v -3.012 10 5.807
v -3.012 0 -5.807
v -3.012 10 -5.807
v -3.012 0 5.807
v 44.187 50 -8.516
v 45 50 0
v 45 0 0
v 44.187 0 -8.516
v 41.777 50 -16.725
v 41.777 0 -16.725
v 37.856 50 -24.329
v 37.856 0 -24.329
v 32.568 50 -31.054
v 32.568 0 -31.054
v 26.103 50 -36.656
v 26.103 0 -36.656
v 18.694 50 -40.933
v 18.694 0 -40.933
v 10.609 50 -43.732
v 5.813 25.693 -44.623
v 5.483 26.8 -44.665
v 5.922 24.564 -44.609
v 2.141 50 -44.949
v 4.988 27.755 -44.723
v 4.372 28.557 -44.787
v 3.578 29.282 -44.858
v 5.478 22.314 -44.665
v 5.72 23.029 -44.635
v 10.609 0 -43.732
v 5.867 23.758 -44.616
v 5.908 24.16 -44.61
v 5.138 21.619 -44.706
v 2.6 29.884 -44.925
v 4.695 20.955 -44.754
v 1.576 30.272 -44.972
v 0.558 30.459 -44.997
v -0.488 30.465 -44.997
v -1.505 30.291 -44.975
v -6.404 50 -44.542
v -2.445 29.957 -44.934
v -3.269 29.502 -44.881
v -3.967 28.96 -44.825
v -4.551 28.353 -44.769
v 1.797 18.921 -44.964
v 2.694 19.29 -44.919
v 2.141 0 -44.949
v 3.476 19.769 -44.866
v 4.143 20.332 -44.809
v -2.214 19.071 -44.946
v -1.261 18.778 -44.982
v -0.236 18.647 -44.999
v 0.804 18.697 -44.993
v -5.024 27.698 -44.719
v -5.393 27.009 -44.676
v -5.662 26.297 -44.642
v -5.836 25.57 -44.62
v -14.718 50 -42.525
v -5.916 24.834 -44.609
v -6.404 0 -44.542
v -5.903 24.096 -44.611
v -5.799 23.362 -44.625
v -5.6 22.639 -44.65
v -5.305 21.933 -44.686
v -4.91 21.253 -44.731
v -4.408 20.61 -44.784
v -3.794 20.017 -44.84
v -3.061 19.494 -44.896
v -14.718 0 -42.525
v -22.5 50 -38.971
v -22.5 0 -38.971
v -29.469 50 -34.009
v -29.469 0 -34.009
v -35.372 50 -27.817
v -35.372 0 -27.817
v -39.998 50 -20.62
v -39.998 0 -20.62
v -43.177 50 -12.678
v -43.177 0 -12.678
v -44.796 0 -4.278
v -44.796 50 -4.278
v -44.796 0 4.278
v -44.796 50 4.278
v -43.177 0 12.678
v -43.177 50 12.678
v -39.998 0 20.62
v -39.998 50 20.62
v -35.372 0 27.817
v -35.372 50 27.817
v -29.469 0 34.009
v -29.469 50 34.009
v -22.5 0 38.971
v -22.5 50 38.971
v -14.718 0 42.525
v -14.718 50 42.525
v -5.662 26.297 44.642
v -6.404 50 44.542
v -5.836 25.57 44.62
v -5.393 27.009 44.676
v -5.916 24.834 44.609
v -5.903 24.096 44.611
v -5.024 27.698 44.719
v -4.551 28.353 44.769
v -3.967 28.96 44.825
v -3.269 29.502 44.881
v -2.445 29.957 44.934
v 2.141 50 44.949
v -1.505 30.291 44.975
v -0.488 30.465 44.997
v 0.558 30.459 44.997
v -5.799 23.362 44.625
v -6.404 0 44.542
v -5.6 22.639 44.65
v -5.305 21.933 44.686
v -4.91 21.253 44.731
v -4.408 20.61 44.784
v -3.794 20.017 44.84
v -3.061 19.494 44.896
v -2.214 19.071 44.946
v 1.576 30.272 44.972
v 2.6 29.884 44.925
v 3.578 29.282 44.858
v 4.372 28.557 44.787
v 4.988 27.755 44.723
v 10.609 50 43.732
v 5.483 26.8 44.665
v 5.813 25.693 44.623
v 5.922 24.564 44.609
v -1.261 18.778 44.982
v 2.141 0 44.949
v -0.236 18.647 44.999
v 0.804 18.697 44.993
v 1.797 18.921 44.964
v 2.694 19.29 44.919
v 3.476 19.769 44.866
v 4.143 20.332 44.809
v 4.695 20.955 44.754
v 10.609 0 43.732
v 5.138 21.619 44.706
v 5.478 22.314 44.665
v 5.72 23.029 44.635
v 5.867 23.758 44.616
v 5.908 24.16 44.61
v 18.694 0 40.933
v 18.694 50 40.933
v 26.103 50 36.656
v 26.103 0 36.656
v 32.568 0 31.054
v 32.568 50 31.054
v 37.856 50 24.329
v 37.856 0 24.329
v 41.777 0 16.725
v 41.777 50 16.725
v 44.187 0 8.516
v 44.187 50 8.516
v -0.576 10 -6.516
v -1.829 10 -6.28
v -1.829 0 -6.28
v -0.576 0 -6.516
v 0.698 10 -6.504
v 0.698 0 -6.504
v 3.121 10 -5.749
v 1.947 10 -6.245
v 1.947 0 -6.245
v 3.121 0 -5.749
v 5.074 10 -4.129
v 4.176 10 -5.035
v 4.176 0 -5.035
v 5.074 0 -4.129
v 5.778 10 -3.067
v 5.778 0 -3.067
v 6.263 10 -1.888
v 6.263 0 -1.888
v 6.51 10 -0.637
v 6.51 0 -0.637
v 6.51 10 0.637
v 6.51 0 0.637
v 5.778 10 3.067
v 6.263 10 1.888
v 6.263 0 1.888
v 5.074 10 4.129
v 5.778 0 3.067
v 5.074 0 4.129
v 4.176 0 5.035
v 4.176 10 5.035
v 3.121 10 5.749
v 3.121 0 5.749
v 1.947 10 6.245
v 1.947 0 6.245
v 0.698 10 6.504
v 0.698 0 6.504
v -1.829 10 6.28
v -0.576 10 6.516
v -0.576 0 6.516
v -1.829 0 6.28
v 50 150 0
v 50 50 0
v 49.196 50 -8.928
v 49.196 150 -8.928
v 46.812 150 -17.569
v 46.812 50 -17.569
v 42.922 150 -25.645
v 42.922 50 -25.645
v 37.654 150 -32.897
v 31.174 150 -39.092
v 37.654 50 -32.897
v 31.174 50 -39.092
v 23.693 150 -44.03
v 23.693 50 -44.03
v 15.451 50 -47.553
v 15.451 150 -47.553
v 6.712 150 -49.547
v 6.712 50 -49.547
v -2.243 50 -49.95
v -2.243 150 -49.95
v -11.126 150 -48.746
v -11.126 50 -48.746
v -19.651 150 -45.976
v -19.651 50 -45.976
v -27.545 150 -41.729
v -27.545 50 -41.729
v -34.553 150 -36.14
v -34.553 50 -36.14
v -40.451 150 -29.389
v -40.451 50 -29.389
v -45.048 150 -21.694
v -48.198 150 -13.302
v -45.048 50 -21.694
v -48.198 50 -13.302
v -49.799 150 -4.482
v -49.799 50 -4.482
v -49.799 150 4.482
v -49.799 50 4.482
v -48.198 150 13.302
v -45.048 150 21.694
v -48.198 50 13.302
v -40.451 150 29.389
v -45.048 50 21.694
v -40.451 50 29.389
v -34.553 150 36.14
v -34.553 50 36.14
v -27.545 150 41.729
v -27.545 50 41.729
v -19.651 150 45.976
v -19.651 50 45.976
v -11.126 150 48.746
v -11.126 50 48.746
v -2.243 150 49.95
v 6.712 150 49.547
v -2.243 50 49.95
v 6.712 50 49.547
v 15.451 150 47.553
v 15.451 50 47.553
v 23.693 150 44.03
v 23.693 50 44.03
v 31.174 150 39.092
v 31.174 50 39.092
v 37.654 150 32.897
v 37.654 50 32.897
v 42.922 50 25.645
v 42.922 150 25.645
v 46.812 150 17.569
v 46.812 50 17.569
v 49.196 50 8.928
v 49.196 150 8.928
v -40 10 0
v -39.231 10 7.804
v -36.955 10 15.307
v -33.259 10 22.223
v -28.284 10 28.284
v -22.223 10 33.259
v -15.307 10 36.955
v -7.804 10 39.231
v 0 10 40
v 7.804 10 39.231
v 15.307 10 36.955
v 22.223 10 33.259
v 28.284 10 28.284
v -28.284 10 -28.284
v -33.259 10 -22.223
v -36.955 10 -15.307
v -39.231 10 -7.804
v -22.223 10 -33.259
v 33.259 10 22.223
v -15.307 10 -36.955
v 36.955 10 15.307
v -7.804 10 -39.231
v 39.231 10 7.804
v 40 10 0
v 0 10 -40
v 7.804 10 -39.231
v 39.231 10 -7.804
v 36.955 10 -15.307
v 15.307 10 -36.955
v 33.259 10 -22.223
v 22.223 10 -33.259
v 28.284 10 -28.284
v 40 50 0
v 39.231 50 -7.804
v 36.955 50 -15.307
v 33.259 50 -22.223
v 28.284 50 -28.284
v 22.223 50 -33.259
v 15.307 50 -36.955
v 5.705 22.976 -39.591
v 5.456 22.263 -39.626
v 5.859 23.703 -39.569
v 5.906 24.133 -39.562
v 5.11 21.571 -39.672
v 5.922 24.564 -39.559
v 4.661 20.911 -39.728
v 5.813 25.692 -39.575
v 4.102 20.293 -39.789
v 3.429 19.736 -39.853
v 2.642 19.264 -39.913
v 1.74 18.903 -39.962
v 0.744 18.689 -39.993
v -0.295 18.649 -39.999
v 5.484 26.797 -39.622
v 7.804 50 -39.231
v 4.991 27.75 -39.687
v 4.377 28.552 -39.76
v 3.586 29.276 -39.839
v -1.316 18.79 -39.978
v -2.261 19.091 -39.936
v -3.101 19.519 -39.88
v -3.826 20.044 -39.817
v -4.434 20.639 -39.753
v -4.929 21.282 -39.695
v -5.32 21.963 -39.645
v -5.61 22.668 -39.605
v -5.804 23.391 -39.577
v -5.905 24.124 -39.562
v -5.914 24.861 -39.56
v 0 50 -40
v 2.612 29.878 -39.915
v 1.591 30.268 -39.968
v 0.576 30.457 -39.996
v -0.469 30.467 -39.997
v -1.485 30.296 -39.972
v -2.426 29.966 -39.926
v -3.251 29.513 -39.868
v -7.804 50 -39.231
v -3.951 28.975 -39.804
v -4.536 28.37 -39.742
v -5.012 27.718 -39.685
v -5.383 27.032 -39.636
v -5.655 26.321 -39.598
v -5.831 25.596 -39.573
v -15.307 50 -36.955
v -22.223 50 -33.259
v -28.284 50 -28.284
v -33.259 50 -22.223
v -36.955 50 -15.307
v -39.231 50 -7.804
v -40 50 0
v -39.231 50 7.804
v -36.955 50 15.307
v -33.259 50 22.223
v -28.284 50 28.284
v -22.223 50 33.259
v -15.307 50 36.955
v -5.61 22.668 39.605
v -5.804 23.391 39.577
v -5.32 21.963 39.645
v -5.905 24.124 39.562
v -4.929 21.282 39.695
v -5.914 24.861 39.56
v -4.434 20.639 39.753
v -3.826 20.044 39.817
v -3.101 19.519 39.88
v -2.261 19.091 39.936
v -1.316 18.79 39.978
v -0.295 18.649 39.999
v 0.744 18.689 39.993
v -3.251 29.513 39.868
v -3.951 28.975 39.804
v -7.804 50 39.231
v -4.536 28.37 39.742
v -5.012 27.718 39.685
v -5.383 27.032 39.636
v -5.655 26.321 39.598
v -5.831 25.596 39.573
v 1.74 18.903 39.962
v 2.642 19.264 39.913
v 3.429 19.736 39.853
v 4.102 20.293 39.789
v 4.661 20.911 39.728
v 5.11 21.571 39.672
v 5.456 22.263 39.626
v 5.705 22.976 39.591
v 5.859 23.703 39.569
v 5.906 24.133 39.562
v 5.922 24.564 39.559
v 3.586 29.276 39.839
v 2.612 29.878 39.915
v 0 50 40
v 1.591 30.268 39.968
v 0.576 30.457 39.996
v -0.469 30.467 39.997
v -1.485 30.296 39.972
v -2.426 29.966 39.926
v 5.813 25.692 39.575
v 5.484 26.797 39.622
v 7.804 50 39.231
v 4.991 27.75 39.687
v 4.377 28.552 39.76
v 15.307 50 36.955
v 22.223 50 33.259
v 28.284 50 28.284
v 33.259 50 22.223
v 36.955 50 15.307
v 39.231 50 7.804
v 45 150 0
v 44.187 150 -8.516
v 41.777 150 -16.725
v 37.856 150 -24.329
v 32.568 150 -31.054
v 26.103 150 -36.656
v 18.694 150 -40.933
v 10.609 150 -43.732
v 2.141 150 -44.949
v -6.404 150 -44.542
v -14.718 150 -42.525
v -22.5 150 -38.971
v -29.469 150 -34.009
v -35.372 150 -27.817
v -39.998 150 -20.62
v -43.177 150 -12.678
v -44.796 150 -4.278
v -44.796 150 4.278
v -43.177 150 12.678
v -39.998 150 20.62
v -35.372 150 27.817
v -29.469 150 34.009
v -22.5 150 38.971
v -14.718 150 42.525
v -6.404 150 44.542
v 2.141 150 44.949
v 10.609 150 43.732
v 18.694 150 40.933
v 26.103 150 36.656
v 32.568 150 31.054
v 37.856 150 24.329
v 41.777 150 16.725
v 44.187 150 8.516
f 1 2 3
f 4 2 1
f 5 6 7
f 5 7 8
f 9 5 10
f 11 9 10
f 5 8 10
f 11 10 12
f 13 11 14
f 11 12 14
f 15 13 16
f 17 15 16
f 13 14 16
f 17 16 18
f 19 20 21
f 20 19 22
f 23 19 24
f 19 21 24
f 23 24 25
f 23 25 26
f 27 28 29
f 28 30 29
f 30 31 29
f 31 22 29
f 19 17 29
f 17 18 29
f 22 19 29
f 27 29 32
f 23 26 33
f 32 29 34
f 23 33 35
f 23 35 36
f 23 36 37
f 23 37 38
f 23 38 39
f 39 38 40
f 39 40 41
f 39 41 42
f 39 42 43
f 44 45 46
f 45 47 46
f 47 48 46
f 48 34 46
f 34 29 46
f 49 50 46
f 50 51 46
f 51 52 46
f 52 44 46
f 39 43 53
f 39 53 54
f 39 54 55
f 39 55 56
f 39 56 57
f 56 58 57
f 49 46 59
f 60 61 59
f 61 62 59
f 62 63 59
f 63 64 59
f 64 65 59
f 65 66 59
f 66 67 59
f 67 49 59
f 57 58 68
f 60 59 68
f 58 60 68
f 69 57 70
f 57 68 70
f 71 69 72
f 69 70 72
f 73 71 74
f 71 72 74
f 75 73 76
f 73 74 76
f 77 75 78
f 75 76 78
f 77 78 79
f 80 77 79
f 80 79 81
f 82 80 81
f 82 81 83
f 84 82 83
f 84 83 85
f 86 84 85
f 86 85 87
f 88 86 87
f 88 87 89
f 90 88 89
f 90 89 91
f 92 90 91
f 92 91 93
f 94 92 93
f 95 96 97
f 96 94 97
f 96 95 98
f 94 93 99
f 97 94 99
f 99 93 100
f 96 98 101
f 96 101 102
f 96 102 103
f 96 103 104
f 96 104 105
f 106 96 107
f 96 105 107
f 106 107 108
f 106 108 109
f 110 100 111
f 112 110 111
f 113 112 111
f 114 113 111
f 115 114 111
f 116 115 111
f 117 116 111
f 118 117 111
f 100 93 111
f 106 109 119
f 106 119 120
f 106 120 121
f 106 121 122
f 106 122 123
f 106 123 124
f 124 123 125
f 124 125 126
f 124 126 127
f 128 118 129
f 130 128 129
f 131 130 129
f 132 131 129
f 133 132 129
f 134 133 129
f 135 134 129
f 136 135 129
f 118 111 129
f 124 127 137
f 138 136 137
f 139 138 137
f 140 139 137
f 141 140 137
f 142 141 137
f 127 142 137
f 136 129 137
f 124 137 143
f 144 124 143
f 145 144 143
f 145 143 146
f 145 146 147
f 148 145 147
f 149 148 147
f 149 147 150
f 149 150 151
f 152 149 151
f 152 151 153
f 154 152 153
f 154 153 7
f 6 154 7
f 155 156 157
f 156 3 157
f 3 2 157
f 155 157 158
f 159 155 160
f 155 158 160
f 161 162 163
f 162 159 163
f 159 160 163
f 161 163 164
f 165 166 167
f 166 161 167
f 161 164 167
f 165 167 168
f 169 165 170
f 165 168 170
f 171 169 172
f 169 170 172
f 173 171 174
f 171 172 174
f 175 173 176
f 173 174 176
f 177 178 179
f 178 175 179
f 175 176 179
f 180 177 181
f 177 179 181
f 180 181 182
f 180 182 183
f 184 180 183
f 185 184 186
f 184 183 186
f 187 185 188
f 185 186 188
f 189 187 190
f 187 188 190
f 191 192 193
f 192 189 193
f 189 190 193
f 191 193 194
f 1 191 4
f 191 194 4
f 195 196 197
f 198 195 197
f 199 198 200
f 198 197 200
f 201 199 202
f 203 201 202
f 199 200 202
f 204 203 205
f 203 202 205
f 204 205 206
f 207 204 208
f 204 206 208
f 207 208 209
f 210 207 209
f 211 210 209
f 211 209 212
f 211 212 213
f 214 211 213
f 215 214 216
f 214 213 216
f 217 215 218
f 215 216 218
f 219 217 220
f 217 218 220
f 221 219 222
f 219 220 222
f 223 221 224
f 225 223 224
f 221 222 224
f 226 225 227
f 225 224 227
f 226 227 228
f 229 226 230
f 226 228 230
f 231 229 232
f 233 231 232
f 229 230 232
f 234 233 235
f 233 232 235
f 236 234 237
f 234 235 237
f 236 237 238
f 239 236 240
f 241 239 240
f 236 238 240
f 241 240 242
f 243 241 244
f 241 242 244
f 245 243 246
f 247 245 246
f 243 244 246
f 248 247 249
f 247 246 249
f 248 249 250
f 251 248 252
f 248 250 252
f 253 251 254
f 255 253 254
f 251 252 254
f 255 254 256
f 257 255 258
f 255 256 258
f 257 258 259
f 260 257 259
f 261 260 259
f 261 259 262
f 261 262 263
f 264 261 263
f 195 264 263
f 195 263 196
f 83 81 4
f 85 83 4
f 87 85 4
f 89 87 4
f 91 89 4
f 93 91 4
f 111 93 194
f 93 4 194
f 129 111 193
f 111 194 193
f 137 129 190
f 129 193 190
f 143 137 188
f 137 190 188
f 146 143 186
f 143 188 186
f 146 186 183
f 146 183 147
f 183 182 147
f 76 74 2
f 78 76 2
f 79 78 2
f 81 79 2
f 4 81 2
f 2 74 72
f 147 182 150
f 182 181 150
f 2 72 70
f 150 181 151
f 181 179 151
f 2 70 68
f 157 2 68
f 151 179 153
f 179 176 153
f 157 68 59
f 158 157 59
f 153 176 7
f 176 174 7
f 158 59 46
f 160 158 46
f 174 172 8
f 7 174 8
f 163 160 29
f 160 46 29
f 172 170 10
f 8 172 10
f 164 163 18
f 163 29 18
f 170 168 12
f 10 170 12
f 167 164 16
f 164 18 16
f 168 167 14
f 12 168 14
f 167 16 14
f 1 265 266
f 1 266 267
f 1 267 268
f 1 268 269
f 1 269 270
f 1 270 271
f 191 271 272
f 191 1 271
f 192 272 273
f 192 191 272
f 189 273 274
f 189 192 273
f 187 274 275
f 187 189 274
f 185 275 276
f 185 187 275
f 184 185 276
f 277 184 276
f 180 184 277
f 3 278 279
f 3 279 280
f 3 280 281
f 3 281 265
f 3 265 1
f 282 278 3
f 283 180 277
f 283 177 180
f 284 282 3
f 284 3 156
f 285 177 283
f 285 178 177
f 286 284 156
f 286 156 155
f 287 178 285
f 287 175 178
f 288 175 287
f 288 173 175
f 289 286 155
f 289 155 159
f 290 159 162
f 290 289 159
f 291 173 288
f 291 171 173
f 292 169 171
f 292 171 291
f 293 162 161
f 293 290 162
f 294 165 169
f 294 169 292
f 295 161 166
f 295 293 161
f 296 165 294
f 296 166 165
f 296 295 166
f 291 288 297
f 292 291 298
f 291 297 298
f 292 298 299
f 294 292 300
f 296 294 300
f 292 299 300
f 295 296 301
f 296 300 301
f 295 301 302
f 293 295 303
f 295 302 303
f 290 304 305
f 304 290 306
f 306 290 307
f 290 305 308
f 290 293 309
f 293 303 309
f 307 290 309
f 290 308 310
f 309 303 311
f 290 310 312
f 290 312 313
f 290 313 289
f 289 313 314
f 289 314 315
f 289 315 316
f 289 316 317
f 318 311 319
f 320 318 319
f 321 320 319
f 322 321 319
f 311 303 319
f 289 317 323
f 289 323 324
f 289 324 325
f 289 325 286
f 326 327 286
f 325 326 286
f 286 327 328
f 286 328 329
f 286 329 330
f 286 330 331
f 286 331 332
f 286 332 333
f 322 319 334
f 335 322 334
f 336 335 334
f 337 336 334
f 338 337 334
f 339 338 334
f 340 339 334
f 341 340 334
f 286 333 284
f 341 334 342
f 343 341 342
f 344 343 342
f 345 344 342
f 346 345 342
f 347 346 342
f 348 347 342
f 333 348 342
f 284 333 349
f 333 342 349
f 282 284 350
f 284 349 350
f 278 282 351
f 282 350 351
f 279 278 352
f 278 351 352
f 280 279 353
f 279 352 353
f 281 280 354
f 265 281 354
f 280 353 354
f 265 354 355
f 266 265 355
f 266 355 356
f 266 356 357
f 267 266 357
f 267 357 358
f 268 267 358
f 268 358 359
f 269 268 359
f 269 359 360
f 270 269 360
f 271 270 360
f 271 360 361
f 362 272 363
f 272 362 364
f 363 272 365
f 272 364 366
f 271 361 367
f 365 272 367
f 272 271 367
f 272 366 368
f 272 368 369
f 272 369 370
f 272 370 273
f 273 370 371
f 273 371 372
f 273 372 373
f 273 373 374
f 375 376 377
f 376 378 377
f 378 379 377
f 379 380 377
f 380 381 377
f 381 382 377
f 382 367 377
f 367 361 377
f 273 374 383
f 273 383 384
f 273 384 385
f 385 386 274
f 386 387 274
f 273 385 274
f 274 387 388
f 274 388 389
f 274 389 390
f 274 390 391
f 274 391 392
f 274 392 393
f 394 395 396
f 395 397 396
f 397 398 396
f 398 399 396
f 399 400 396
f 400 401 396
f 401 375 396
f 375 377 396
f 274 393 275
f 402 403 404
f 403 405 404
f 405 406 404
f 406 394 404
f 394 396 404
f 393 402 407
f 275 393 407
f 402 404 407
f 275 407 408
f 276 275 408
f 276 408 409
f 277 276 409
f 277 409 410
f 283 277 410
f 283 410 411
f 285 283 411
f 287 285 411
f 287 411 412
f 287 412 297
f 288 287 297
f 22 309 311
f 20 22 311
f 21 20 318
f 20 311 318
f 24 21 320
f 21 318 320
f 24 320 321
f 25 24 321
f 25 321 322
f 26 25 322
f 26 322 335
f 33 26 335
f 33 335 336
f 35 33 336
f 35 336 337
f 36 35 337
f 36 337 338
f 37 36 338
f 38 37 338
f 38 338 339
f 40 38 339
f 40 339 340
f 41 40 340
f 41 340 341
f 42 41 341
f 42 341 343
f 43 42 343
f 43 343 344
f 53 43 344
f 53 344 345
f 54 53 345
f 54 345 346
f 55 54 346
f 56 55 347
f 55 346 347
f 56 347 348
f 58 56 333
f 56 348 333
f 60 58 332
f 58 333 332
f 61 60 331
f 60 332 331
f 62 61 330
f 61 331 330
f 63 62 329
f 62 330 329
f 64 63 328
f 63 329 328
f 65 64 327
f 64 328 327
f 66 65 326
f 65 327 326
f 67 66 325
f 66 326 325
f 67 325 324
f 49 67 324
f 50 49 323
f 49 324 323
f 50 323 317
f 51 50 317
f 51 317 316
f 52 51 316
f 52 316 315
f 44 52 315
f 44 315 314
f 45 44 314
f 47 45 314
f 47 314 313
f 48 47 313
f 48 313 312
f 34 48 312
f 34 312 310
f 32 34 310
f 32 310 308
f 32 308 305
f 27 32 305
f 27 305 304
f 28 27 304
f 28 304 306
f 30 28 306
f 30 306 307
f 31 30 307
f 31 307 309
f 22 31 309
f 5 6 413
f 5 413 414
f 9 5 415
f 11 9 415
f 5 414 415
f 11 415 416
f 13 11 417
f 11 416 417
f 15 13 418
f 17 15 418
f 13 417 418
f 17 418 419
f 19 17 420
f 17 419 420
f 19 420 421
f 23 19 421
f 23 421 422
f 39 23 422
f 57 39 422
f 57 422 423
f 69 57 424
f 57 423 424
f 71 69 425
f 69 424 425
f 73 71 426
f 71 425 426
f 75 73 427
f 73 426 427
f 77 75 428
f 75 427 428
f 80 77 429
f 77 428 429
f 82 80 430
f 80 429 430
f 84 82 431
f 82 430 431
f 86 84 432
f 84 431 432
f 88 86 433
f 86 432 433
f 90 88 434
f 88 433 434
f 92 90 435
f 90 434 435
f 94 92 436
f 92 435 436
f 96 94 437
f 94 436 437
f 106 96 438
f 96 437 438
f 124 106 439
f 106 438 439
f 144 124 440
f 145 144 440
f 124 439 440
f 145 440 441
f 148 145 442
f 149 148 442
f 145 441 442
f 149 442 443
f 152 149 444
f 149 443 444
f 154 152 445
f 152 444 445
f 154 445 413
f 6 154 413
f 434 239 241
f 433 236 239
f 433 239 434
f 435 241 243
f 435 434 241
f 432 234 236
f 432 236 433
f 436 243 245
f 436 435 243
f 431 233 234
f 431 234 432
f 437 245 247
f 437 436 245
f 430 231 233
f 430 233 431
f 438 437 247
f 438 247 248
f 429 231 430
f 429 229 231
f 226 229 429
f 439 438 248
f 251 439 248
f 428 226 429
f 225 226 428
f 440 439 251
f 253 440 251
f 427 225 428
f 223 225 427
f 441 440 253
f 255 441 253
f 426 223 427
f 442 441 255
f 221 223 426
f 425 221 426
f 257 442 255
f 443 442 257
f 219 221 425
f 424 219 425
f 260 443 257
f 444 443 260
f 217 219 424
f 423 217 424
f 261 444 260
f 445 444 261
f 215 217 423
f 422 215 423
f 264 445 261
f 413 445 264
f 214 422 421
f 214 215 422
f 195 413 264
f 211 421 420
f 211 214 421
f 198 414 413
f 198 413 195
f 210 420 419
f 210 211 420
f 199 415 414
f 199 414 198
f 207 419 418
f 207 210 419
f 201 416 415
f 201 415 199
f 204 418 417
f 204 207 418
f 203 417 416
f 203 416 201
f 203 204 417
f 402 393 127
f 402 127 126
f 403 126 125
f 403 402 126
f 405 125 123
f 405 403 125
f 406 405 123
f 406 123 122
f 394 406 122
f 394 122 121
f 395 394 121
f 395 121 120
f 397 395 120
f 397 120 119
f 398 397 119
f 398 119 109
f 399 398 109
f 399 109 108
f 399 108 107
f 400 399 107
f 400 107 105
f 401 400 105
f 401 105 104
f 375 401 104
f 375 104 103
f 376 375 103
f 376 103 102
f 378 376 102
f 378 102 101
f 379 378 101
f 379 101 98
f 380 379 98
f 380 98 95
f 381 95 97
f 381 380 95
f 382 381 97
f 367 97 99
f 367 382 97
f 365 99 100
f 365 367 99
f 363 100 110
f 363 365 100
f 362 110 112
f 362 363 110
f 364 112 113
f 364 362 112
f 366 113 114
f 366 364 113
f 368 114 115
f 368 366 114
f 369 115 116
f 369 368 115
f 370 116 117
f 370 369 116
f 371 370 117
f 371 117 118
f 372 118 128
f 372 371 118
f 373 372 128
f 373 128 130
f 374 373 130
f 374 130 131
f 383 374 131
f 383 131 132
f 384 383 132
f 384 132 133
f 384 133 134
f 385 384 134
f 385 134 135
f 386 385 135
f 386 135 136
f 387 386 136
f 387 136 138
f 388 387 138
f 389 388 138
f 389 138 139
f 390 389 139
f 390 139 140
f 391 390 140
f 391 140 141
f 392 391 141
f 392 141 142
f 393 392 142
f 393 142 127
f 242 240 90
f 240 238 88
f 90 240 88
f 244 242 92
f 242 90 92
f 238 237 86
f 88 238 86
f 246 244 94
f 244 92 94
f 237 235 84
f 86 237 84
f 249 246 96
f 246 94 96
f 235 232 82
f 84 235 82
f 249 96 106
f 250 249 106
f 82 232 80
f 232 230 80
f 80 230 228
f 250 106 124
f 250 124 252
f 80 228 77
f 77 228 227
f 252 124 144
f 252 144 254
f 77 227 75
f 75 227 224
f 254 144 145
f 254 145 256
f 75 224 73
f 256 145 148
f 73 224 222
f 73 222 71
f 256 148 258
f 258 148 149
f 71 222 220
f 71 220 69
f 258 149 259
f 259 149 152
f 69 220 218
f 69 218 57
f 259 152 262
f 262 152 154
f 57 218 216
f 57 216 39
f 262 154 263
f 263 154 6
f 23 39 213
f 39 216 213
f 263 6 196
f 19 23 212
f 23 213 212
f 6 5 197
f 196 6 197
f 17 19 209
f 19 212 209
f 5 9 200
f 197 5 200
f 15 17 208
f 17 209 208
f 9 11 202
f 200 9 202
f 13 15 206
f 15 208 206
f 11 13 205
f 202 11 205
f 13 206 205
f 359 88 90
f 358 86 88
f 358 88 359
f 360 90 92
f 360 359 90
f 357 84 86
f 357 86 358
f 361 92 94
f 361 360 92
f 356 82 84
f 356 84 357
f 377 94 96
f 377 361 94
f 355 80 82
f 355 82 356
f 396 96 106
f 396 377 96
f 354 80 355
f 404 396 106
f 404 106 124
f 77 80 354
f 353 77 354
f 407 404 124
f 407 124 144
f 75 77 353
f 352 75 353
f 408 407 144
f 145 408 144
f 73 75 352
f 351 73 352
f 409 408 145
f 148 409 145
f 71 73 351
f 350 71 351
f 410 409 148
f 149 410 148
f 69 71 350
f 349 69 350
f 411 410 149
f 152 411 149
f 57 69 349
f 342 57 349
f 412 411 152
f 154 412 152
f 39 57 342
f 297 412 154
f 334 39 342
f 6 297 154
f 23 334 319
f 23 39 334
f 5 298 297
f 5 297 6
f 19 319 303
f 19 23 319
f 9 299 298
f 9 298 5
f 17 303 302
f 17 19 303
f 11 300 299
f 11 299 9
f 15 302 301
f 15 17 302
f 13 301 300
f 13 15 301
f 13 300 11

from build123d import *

# Parameters (mm, degrees)
CROQUIS1_R                 = 45
SALIENTE_EXTRUIR1_DEPTH    = 50
CROQUIS2_R                 = 40
CORTAR_EXTRUIR1_DEPTH      = 40
CROQUIS3_R                 = 6.541345014
CORTAR_EXTRUIR2_DEPTH      = 40
CROQUIS4_W                 = 7.058156528
CROQUIS4_H                 = 15.437867096
SALIENTE_EXTRUIR3_DEPTH    = 10
CROQUIS6_R                 = 5.921699686
CORTAR_EXTRUIR4_DEPTH      = 46
CORTAR_EXTRUIR4_DEPTH_BACK = 46
CROQUIS9_R                 = 50
SALIENTE_EXTRUIR5_DEPTH    = 100
CROQUIS10_R                = 45
CORTAR_EXTRUIR6_DEPTH      = 100


with BuildPart() as part:
    # Croquis1 → Saliente-Extruir1 (new body)
    with BuildSketch(Plane(origin=(0, 0, 0), x_dir=(1, 0, 0), z_dir=(0, 1, 0))):
        Circle(CROQUIS1_R)
    extrude(amount=SALIENTE_EXTRUIR1_DEPTH)

    # Croquis2 → Cortar-Extruir1 (cut)
    with BuildSketch(Plane(origin=(0, 50, 0), x_dir=(1, 0, 0), z_dir=(0, 1, 0))):
        Circle(CROQUIS2_R)
    extrude(amount=-CORTAR_EXTRUIR1_DEPTH, mode=Mode.SUBTRACT)

    # Croquis3 → Cortar-Extruir2 (cut)
    with BuildSketch(Plane.XZ):
        Circle(CROQUIS3_R)
    extrude(amount=-CORTAR_EXTRUIR2_DEPTH, mode=Mode.SUBTRACT)

    # Croquis4 → Saliente-Extruir3 (add)
    with BuildSketch(Plane.XZ):
        with Locations((-6.541345014, 0)):
            Rectangle(CROQUIS4_W, CROQUIS4_H)
    extrude(amount=-SALIENTE_EXTRUIR3_DEPTH)

    # Croquis6 → Cortar-Extruir4 (cut, two sides)
    with BuildSketch(Plane.XY) as cortar_extruir4_sk:
        with Locations((0, 24.563563624)):
            Circle(CROQUIS6_R)
    extrude(amount=CORTAR_EXTRUIR4_DEPTH, mode=Mode.SUBTRACT)
    extrude(cortar_extruir4_sk.sketch, amount=-CORTAR_EXTRUIR4_DEPTH_BACK, mode=Mode.SUBTRACT)

    # Croquis9 → Saliente-Extruir5 (add)
    with BuildSketch(Plane(origin=(0, 50, 0), x_dir=(1, 0, 0), z_dir=(0, 1, 0))):
        Circle(CROQUIS9_R)
    extrude(amount=SALIENTE_EXTRUIR5_DEPTH)

    # Croquis10 → Cortar-Extruir6 (cut)
    with BuildSketch(Plane(origin=(0, 150, 0), x_dir=(1, 0, 0), z_dir=(0, 1, 0))):
        Circle(CROQUIS10_R)
    extrude(amount=-CORTAR_EXTRUIR6_DEPTH, mode=Mode.SUBTRACT)


solid = part.part
